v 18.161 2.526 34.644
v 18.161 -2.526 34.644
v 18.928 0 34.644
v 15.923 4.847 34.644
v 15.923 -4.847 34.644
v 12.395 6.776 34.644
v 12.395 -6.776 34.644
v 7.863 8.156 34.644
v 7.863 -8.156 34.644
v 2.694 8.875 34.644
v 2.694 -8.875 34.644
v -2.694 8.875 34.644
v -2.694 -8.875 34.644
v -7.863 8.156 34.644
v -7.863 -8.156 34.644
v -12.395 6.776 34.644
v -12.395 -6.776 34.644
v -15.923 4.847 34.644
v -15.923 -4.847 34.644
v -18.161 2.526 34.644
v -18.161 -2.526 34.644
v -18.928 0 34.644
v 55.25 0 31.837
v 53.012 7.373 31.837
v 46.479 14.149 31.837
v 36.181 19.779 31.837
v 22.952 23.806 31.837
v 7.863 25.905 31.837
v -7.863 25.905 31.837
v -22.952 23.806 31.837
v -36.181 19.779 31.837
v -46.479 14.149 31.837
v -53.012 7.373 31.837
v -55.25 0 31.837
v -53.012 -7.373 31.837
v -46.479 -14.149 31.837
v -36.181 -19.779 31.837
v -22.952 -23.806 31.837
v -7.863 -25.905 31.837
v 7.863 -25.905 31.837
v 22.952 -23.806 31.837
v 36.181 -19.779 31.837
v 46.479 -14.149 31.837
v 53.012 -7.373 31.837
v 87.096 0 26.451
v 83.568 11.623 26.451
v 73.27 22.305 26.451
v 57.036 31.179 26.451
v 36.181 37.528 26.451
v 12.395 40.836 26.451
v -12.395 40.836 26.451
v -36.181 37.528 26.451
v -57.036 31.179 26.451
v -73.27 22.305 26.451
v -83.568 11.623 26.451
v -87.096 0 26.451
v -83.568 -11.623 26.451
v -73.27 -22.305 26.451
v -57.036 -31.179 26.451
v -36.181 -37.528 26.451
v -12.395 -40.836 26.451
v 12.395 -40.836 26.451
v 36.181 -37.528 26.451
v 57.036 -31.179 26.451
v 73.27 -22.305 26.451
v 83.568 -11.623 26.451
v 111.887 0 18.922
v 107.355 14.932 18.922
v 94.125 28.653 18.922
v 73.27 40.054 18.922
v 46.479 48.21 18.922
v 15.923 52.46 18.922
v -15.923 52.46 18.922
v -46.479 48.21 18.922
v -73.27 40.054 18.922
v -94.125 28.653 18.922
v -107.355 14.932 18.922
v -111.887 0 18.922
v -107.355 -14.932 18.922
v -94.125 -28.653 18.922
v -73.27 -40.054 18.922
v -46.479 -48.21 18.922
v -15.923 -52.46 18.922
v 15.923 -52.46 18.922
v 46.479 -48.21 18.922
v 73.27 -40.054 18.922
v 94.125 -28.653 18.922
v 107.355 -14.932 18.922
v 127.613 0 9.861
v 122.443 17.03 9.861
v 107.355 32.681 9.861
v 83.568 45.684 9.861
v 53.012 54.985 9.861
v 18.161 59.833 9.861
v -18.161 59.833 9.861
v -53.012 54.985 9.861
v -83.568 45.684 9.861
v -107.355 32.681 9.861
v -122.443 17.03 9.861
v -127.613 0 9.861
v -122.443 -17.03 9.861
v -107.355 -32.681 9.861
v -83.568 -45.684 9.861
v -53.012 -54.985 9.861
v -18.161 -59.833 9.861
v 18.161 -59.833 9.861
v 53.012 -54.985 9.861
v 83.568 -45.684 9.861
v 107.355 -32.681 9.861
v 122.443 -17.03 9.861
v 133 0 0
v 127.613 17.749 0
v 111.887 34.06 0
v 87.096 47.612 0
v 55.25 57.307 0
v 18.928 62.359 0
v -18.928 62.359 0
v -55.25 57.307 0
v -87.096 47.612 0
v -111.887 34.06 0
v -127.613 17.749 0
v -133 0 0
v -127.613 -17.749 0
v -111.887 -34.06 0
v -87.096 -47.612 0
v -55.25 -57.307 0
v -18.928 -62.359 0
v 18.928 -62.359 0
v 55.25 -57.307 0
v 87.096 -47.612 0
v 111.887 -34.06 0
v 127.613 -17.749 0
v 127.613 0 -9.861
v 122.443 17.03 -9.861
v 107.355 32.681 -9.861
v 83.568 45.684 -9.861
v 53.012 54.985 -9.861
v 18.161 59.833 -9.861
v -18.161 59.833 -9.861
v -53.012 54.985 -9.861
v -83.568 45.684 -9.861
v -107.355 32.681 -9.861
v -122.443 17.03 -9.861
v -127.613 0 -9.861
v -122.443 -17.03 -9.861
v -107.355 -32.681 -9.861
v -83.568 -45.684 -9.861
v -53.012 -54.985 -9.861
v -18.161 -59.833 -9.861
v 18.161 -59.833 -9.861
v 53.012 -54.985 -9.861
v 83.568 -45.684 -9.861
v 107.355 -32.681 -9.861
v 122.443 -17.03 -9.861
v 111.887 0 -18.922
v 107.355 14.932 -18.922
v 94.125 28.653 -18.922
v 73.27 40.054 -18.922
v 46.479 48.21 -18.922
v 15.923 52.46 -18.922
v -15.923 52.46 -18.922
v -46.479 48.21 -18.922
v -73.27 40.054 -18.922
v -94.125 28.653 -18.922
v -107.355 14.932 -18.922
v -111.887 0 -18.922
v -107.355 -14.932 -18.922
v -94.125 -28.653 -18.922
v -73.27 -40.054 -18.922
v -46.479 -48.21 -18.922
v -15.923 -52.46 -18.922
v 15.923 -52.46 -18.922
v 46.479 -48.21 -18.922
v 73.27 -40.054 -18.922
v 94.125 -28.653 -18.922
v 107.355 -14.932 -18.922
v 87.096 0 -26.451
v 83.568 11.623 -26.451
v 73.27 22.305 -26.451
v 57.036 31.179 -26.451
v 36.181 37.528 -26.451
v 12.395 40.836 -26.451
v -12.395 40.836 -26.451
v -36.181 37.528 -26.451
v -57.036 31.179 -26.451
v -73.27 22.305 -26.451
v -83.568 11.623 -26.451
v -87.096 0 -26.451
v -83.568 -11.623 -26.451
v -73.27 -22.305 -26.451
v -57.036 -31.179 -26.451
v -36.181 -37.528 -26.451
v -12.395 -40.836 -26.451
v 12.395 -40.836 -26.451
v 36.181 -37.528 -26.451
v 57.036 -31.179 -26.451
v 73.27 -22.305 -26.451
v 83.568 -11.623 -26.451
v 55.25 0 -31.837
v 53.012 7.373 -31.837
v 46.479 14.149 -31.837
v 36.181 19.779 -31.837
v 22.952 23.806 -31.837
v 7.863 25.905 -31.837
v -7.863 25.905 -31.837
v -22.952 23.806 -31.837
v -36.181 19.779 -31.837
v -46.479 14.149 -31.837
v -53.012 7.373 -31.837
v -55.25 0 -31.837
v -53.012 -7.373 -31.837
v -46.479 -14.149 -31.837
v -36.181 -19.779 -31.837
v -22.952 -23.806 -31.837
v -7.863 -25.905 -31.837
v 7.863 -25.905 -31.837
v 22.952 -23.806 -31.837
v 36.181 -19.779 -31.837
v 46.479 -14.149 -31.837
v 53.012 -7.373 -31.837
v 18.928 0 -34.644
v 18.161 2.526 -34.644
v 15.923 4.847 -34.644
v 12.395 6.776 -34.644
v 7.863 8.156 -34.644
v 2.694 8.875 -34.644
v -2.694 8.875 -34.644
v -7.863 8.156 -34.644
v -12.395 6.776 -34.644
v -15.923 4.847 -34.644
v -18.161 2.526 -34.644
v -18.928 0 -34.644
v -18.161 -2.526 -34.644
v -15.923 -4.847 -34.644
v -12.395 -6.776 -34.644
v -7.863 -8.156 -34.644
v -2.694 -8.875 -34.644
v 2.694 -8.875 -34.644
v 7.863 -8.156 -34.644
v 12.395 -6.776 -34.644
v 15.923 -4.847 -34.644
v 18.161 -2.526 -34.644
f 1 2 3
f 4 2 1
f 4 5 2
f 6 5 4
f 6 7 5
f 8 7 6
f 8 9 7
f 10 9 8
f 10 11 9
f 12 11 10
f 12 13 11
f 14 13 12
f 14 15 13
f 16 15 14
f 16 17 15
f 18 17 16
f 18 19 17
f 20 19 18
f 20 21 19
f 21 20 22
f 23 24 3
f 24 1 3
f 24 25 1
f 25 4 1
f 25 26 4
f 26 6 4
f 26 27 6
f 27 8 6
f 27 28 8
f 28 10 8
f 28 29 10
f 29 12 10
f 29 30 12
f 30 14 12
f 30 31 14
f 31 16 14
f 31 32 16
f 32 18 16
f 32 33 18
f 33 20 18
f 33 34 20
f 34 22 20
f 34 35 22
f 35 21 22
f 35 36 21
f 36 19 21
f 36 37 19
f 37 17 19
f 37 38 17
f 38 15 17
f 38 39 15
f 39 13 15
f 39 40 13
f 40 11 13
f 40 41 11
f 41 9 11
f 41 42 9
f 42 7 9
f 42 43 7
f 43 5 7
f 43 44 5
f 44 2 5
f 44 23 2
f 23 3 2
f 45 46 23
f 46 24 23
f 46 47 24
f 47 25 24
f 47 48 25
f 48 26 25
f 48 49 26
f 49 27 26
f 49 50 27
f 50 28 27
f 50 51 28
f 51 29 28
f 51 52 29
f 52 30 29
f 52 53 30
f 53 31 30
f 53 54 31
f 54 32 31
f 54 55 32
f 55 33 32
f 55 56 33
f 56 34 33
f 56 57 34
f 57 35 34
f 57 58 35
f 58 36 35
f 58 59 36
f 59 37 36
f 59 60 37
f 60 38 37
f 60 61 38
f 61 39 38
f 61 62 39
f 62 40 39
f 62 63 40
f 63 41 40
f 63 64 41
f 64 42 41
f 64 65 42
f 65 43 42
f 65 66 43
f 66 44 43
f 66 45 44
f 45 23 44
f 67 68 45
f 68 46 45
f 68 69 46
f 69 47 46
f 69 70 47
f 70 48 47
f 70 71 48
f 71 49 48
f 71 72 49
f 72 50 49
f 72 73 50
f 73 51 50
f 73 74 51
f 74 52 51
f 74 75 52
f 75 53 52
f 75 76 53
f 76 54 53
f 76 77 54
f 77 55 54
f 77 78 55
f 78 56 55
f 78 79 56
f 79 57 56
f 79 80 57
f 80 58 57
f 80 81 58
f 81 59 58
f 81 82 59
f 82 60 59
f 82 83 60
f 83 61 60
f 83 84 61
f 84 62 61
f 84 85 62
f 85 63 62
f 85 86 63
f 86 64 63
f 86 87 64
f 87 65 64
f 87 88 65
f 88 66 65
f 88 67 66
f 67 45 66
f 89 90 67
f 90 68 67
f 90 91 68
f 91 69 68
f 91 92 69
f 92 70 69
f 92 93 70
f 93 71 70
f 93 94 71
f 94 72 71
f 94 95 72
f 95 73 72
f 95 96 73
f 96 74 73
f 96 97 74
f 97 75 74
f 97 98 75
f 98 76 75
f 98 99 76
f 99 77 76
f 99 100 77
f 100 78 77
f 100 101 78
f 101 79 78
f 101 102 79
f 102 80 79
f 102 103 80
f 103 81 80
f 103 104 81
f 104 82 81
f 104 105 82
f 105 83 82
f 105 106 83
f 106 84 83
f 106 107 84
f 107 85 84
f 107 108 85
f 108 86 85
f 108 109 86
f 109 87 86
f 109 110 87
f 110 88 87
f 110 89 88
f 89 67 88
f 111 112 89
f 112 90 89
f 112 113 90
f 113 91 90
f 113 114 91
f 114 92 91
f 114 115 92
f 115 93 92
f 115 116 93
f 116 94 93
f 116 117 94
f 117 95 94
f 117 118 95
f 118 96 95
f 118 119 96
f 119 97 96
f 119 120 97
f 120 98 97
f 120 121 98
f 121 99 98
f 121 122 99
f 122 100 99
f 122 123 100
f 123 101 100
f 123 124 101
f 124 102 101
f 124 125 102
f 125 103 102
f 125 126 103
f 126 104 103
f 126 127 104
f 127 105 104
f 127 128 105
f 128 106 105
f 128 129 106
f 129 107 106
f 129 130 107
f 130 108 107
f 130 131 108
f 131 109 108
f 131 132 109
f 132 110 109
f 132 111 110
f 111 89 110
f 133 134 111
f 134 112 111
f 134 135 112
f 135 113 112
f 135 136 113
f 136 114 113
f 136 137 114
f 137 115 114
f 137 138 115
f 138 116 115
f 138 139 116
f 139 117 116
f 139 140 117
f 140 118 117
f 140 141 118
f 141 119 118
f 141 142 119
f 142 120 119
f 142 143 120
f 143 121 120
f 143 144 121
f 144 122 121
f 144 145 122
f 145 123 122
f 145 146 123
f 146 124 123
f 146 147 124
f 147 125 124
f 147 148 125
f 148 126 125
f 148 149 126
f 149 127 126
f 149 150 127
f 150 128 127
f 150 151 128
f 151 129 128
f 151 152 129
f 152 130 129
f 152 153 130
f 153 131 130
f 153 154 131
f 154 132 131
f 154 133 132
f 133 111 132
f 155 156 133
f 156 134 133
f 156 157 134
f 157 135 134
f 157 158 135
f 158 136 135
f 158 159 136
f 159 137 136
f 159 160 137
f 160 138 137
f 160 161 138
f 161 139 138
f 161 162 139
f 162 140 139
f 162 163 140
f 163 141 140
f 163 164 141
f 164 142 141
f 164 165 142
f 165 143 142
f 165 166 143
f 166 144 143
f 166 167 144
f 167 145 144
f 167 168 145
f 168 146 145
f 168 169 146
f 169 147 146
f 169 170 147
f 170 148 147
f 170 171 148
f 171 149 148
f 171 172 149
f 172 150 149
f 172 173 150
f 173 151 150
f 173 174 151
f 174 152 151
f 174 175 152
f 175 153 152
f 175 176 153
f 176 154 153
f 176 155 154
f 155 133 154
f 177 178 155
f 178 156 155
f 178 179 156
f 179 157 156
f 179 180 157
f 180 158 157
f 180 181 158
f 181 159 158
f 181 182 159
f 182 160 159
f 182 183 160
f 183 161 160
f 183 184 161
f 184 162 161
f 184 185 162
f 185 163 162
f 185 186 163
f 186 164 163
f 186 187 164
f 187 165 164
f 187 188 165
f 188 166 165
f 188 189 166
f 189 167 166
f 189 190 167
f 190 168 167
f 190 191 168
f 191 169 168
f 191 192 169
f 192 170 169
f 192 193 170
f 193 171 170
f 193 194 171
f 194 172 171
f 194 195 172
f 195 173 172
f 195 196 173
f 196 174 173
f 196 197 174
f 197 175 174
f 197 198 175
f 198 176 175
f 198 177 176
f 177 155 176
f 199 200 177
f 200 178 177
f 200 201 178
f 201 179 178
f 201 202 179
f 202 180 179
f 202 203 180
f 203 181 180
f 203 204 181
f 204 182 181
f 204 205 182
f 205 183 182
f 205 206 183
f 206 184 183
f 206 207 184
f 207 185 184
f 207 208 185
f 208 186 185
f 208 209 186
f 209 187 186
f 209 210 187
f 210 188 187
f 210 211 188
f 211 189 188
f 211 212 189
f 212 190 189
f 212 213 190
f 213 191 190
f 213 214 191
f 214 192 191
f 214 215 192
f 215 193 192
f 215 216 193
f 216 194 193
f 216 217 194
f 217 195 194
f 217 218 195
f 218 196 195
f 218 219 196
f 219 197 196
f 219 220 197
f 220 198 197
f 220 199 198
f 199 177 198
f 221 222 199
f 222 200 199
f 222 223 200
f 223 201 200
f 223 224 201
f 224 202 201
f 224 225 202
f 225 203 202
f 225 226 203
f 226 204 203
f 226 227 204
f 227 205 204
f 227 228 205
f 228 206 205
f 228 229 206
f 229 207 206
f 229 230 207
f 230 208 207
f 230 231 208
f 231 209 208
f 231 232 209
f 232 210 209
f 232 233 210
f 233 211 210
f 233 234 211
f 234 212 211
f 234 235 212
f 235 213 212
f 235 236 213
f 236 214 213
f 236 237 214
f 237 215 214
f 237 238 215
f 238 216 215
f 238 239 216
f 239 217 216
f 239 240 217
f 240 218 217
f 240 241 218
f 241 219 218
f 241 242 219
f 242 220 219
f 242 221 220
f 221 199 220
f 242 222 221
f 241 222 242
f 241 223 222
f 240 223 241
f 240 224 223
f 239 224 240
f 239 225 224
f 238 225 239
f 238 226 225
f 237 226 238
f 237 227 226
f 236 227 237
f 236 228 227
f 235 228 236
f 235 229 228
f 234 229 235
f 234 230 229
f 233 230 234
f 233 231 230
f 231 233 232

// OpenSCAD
// Generated by SolidPython 1.0.1 on 2020-07-29 00:46:53


scale(v = [19, 9, 5]) {
	sphere(r = 7);
}
/***********************************************
*********      SolidPython code:      **********
************************************************
 
# import packages: SolidPython
from solid import *
from solid.utils import *
from itertools import chain, combinations, permutations


class Resize:

    def __init__(self, scad_file):
        self.scad_file = scad_file
        #self.scad_file = import_scad(scad_file)
        # cone/cylinder param:
        self.r1 = 0
        self.r2 = 0
        self.h = 0
        # rectangular prism param:
        self.w = 0
        self.l = 0
        # ellipse param:
        self.r = 0

    # import OpenScad code (file name corresponds to shape)


    # classify shape + parameters
    def assign(self, param1, param2, param3):
        if self.scad_file == 'cone.scad':
            self.r1 = param1
            self.r2 = param2
            self.h = param3
        elif self.scad_file == 'cylinder.scad':
            self.r1 = param1
            self.r2 = param2
            self.h = param3
        elif self.scad_file == 'rectangularPrism.scad':
            self.h = param1
            self.l = param2
            self.w = param3
        else:
            self.r = param1
            self.h = param2

    # resize parameters
    def iterate(self):
        x = range(3, 20, 2)
        i = 1
        if self.scad_file == 'cone.scad':
            tempList = list(permutations(x, 2))
            for temp in tempList:
                param1 = temp[0]
                param2 = temp[1]
                filepath = 'produced_scad_files/' + 'cone' + str(param1) + '_' + str(param2) + '_' + '.scad'
                scad_render_to_file(cylinder(h=param1, r1=param2, r2=0), filepath)

        elif self.scad_file == 'cylinder.scad':
            tempList = list(permutations(x, 3))
            for temp in tempList:
                param1 = temp[0]
                param2 = temp[1]
                filepath = 'produced_scad_files/' + 'cylinder' + str(param1) + '_' + str(param2) + '_' + '.scad'
                scad_render_to_file(cylinder(h=param1, r1=param2, r2=param2), filepath)

        elif self.scad_file == 'rectangularPrism.scad':
            tempList = list(permutations(x, 3))
            for temp in tempList:
                param1 = temp[0]
                param2 = temp[1]
                param3 = temp[2]
                filepath = 'produced_scad_files/' + 'rectangularPrism' + str(param1) + '_' + str(param2) + '_' + str(
                    param3) + '.scad'
                scad_render_to_file(cube(size=(param1, param2, param3)), filepath)

        elif self.scad_file == 'ellipse.scad':
            tempList = list(permutations(x, 4))
            for temp in tempList:
                param1 = temp[0]
                param2 = temp[1]
                param3 = temp[2]
                param4 = temp[3]
                filepath = 'produced_scad_files/' + 'ellipse' + str(param1) + '_' + str(param2) + '_' + str(param3) + '_' + str(param4) + '.scad'
                scad_render_to_file(scale([param1, param2, param3])(sphere(r=param4)), filepath)

    def render_to_scadfile(self):
        scad_render_to_file(scad, 'example.scad') 
 
************************************************/
